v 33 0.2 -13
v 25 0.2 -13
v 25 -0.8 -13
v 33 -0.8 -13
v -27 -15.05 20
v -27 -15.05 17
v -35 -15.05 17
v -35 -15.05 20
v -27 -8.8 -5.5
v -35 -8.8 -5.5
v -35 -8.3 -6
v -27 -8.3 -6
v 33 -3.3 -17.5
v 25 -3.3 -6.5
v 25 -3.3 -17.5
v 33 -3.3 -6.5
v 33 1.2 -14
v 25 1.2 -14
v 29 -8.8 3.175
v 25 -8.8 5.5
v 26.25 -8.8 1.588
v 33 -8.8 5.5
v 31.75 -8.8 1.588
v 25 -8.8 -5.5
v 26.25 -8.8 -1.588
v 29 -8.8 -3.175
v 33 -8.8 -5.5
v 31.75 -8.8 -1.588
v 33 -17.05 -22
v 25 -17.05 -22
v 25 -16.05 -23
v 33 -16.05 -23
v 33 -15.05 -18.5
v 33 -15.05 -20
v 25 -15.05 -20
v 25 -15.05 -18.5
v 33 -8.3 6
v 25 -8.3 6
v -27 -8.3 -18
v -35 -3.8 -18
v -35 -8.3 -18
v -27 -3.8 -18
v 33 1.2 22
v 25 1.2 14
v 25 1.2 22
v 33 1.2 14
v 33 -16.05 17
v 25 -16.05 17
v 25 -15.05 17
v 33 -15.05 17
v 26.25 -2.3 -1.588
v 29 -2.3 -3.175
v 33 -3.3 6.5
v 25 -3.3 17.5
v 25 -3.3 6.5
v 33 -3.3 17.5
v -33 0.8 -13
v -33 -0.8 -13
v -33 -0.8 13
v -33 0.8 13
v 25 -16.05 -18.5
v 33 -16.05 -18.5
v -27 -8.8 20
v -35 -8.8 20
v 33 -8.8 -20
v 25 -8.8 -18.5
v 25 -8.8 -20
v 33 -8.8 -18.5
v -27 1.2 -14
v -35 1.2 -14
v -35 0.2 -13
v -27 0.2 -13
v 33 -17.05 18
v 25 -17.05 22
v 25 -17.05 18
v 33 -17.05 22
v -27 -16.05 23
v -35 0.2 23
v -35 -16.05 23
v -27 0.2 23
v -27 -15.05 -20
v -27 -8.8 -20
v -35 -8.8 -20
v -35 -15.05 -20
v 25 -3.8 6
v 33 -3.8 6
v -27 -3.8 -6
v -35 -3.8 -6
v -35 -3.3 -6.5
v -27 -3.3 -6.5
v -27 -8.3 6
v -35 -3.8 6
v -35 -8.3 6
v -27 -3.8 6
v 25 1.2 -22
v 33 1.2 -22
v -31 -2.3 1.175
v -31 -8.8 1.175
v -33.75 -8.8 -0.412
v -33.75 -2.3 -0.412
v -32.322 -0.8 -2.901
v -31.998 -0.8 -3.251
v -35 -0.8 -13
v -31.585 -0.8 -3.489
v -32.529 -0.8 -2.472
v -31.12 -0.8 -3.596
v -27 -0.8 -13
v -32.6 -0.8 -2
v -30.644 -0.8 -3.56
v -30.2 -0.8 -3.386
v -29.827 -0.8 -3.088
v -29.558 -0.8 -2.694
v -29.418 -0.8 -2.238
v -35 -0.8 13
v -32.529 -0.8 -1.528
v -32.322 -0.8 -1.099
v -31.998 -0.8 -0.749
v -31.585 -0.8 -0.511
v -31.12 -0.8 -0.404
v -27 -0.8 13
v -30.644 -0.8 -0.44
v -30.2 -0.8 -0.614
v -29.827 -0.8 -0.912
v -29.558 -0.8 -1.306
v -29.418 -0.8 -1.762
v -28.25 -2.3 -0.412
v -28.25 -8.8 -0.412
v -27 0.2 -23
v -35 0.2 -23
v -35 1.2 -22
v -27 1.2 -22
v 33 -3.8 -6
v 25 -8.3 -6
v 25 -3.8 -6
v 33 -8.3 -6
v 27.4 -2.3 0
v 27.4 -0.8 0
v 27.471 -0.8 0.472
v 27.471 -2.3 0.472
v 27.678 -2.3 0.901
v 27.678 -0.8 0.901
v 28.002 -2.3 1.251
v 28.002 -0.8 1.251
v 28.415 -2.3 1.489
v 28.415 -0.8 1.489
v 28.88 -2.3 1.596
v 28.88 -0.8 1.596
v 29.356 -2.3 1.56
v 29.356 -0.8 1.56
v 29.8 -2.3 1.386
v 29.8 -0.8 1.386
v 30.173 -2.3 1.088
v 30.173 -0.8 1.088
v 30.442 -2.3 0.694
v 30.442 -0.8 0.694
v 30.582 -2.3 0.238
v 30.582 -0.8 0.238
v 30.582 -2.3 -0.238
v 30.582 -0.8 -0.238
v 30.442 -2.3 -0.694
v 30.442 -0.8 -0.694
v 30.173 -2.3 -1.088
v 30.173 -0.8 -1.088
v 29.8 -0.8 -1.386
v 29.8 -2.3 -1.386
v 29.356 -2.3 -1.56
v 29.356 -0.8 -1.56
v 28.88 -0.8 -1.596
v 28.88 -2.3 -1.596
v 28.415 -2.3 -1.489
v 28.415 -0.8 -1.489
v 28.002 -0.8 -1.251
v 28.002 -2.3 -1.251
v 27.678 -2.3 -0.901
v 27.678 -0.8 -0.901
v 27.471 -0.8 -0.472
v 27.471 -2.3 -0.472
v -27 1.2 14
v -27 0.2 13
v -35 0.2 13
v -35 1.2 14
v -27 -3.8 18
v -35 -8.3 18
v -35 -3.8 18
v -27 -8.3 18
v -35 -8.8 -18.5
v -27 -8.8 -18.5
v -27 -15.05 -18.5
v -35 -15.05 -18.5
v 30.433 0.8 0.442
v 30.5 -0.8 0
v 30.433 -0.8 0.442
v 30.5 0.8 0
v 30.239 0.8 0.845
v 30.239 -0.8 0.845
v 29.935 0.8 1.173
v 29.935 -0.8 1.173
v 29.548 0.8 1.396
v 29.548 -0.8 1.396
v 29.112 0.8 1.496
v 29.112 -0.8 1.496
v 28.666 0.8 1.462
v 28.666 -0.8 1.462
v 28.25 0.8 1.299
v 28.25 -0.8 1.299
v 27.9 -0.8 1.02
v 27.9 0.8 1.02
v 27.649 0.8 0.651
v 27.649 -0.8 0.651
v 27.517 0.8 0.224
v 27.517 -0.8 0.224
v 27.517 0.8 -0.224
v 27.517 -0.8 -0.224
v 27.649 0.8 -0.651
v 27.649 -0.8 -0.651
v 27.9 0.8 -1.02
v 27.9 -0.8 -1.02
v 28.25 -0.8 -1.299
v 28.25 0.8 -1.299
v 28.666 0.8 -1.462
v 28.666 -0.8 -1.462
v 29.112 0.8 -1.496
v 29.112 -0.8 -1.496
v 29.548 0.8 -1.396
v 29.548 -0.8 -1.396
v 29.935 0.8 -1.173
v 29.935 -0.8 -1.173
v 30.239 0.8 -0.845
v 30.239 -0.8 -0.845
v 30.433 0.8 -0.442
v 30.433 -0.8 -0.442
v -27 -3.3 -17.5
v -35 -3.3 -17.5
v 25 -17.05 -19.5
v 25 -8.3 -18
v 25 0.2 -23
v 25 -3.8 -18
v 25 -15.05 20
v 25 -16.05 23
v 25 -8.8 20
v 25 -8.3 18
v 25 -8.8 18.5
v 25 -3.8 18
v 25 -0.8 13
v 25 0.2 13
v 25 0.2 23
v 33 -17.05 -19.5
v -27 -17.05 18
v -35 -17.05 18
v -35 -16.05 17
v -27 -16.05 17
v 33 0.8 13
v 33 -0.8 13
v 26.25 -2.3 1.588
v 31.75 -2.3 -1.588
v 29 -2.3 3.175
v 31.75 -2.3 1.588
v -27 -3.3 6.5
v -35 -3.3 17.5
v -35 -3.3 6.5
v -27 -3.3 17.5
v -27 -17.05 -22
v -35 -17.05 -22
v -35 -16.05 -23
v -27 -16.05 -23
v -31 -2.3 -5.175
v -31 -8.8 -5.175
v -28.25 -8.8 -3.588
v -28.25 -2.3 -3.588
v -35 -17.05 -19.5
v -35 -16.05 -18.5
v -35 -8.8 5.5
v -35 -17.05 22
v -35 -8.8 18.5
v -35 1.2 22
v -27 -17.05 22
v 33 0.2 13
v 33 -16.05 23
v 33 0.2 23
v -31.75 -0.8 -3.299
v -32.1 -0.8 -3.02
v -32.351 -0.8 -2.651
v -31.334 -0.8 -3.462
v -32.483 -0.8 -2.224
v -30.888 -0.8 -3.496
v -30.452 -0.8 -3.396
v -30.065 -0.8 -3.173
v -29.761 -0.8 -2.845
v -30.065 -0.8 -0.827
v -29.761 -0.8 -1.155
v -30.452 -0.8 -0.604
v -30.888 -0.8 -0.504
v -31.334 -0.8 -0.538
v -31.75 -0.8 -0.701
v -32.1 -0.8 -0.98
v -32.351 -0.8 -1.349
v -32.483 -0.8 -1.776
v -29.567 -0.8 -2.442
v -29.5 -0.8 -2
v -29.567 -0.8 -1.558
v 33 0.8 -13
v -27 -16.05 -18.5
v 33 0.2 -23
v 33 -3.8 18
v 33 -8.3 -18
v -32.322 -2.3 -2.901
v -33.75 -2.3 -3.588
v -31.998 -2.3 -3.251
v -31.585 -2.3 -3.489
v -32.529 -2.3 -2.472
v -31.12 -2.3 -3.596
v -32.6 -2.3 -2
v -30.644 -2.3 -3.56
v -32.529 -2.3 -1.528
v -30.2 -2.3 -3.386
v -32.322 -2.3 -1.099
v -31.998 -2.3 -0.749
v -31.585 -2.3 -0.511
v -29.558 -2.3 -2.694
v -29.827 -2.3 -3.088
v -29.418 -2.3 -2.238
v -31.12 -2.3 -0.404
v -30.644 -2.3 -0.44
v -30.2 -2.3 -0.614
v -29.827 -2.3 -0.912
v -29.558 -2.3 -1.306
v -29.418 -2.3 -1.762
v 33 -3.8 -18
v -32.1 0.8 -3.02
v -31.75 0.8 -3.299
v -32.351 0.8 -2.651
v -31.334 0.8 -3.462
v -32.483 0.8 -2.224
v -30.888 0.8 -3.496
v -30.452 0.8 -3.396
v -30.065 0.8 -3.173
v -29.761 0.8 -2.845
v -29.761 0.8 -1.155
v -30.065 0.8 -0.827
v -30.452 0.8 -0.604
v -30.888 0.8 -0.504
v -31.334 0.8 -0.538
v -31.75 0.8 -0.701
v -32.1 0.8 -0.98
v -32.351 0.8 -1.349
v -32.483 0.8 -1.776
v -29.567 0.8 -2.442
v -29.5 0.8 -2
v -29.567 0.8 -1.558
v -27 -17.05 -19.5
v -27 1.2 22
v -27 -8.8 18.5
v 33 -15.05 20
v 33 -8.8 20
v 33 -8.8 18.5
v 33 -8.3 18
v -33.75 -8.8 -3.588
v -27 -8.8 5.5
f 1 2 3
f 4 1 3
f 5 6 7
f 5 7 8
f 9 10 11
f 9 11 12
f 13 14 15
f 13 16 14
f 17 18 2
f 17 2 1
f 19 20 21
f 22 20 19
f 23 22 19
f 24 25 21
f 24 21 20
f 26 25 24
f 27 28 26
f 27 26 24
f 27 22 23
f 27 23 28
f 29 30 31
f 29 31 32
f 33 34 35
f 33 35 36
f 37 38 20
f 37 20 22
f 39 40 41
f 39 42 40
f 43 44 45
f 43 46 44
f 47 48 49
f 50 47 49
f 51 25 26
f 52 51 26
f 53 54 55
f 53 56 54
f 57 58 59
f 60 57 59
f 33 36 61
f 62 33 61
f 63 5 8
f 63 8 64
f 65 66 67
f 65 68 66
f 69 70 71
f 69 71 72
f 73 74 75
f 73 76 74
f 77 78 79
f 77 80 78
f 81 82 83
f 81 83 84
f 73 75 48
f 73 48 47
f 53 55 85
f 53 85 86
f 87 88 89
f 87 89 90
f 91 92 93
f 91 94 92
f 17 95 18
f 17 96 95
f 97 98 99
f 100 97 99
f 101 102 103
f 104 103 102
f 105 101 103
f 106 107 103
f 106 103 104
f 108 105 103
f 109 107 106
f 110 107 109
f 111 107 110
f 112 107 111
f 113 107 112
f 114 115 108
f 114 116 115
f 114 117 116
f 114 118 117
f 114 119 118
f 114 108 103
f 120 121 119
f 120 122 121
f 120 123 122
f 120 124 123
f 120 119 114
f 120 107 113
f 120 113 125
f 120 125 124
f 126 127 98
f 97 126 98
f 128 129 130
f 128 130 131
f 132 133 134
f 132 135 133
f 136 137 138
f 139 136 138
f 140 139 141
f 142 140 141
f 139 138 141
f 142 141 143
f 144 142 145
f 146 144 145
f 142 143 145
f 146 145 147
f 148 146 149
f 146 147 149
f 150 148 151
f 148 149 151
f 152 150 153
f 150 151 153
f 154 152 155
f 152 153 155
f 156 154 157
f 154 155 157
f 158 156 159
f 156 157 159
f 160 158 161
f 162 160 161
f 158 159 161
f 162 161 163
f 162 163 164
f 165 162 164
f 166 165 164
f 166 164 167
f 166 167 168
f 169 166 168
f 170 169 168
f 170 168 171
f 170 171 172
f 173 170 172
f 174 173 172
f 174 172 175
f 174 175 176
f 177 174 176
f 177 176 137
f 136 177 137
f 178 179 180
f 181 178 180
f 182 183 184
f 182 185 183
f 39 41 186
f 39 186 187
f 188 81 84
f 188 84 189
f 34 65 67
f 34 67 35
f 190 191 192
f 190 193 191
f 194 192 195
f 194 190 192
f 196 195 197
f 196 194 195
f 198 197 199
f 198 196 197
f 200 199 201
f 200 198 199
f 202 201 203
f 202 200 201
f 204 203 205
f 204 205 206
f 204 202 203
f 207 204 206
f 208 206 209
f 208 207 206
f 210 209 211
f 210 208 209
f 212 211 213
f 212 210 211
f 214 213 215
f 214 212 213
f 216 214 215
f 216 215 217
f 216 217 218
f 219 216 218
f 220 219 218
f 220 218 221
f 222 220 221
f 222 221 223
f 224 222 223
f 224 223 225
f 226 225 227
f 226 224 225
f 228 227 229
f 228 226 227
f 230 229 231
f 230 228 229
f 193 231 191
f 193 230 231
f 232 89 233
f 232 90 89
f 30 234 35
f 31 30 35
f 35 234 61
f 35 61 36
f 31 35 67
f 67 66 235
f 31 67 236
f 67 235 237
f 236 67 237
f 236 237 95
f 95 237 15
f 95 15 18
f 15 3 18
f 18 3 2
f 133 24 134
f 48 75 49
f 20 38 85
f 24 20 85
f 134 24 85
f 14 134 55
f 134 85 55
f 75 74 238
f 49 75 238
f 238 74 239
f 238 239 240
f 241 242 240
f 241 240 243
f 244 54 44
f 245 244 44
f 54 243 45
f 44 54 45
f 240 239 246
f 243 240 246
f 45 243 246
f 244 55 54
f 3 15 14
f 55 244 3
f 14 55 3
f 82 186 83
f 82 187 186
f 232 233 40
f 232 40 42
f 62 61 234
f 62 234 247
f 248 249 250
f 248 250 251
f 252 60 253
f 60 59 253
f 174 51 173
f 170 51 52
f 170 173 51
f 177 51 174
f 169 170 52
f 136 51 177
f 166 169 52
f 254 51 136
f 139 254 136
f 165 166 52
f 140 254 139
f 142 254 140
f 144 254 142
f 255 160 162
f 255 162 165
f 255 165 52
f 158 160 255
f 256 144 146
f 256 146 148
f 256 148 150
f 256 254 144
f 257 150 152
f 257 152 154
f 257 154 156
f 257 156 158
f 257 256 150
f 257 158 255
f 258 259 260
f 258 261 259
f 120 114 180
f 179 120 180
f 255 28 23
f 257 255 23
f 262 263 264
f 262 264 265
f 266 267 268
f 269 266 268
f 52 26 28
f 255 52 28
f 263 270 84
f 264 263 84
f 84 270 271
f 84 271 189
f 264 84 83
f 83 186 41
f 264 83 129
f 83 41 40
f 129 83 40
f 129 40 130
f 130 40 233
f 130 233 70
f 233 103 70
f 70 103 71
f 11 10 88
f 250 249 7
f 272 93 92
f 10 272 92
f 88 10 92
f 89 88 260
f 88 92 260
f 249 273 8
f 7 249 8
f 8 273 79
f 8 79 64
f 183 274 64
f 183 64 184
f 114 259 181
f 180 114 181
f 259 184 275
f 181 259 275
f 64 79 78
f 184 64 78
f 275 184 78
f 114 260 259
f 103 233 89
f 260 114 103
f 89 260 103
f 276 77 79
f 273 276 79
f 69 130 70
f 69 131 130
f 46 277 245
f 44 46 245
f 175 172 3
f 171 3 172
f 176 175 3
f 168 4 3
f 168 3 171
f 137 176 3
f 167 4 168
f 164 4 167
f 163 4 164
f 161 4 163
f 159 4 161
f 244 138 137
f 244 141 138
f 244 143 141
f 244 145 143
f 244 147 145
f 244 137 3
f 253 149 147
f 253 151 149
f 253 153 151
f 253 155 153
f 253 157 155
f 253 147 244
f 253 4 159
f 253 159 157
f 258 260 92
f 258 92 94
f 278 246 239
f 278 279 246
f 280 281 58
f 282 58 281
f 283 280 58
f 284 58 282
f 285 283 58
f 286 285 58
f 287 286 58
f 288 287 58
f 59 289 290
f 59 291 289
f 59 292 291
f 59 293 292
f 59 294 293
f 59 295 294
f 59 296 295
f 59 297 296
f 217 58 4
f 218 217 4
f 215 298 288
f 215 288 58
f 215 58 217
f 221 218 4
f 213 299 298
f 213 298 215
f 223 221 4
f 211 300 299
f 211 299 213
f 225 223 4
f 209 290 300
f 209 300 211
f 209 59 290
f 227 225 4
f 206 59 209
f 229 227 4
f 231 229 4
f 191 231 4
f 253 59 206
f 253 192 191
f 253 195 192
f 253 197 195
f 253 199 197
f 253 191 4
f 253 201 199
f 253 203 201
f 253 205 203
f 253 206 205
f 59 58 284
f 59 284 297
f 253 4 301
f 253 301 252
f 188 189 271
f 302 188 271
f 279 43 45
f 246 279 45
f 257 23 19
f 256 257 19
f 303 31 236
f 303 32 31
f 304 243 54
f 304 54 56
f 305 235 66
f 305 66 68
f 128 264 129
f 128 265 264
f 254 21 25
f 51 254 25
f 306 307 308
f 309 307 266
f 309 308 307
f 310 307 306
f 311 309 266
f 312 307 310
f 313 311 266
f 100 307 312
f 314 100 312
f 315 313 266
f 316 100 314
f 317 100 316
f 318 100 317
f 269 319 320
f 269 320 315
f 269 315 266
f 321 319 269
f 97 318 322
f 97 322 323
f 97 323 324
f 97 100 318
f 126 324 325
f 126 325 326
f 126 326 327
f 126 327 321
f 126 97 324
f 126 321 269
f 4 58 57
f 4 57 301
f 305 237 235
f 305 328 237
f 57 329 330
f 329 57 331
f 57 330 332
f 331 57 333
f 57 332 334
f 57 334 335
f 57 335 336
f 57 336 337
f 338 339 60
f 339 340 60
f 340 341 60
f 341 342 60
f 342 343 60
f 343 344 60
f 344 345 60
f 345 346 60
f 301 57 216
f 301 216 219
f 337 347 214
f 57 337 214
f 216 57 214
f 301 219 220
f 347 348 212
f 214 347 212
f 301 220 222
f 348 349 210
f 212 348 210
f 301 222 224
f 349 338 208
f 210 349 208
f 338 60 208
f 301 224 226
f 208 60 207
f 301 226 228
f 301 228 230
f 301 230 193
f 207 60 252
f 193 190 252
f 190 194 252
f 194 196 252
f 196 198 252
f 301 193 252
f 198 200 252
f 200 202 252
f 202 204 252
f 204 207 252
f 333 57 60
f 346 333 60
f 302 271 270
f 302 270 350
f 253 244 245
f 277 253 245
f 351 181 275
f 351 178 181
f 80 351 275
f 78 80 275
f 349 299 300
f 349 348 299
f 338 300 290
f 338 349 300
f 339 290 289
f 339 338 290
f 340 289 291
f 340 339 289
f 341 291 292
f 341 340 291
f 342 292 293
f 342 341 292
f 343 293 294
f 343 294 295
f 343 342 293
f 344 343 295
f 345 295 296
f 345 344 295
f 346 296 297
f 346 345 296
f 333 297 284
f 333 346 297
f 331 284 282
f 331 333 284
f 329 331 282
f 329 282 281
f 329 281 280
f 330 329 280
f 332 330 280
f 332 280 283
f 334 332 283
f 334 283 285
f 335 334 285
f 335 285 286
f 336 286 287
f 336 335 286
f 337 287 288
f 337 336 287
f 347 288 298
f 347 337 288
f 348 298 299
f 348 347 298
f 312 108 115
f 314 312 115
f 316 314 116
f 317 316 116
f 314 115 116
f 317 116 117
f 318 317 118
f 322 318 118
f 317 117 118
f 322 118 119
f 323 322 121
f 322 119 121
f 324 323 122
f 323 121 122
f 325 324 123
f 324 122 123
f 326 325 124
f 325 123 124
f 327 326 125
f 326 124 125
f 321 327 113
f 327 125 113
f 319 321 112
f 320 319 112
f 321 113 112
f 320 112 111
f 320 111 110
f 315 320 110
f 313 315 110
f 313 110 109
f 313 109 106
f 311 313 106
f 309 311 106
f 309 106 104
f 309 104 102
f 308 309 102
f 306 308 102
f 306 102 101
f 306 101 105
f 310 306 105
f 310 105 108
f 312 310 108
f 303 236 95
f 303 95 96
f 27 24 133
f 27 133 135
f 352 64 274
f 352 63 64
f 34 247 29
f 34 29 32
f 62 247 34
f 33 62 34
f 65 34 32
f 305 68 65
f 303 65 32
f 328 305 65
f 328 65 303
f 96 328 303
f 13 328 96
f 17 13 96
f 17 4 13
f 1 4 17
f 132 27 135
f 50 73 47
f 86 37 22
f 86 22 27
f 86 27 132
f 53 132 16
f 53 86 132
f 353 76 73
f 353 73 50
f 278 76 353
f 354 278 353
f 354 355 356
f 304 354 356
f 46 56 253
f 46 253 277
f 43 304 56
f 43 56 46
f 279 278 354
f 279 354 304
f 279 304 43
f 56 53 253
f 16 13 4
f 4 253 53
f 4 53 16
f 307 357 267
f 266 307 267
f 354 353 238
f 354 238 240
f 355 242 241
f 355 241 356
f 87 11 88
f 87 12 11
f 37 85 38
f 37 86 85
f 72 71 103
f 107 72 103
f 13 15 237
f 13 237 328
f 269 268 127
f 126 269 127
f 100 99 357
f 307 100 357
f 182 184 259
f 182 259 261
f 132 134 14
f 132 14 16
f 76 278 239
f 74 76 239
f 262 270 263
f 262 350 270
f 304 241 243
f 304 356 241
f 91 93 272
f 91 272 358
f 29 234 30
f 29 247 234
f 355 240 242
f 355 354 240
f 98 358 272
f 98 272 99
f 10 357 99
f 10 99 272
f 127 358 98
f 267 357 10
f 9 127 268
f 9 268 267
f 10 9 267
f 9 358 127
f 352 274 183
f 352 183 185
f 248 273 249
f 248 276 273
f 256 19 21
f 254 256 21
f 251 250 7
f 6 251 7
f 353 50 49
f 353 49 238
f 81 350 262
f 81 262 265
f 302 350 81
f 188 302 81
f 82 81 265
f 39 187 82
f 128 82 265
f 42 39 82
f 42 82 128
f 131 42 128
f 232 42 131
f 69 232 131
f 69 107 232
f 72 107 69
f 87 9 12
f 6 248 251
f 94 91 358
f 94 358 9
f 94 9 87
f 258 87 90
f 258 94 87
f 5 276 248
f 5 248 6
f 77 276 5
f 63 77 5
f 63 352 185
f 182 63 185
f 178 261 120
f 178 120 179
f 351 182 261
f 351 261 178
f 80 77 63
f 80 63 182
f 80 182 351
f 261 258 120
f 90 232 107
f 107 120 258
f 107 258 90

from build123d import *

# Parameters (mm, degrees)
F0_W      = 66
F0_H      = 26
F0_R      = 1.5
F1_DEPTH  = 0.8
F4_DEPTH  = 4
F5_SIZE   = 0.5
F6_SIZE   = 1
F10_DEPTH = 6.5
F11_D     = 3.2
F11_2_D   = 3.2


with BuildPart() as f1:
    # F0 (on Front) → F1 (new body, symmetric)
    with BuildSketch(Plane.XZ):
        Rectangle(F0_W, F0_H)
        with Locations((-31, -2)):
            Circle(F0_R, mode=Mode.SUBTRACT)
        with Locations((29, 0)):
            Circle(F0_R, mode=Mode.SUBTRACT)
    extrude(amount=F1_DEPTH, both=True)


with BuildPart() as f4:
    # F3 (on face) → F4 (new body, symmetric)
    with BuildSketch(Plane.YZ.offset(29)):
        Polygon((-17.05, 23), (-17.05, 17), (-15.05, 17), (-15.05, 20), (-8.8, 20), (-8.8, 18), (-3.3, 18), (-3.3, 6), (-8.8, 6), (-8.8, -6), (-3.3, -6), (-3.3, -18), (-8.8, -18), (-8.8, -20), (-15.05, -20), (-15.05, -18.5), (-17.05, -18.5), (-17.05, -23), (1.2, -23), (1.2, -13), (-0.8, -13), (-0.8, 13), (1.2, 13), (1.2, 23), align=None)
    extrude(amount=F4_DEPTH, both=True)

    # F5
    f5_edges = [f4.edges().sort_by_distance(p)[0] for p in [
        (29, -8.8, 18),
        (29, -3.3, 18),
        (29, -3.3, 6),
        (29, -8.8, 6),
        (29, -8.8, -6),
        (29, -3.3, -6),
        (29, -3.3, -18),
        (29, -8.8, -18),
    ]]
    chamfer(f5_edges, length=F5_SIZE)

    # F6
    f6_edges = [f4.edges().sort_by_distance(p)[0] for p in [
        (29, 1.2, -23),
        (29, -17.05, -23),
        (29, -17.05, 23),
        (29, -17.05, 17),
        (29, -17.05, -18.5),
        (29, 1.2, 23),
        (29, 1.2, 13),
        (29, 1.2, -13),
    ]]
    chamfer(f6_edges, length=F6_SIZE)


with BuildPart() as f7_1:
    # F7: copy of F4
    add(f4.part.moved(Location((-60, 0, 0))))

    # F8: cut F1
    add(f1.part, mode=Mode.SUBTRACT)


with BuildPart() as f4_1:
    add(f4.part)

    # F8: cut F1
    add(f1.part, mode=Mode.SUBTRACT)


with BuildPart() as f10_tool:
    # F9 (on face) → F10 (new body)
    with BuildSketch(Plane.XZ.offset(8.8)):
        Polygon((-33.75, -0.4122867597), (-33.75, -3.5877132403), (-31, -5.1754264805), (-28.25, -3.5877132403), (-28.25, -0.4122867597), (-31, 1.1754264805), align=None)
        Polygon((26.25, 1.5877132403), (26.25, -1.5877132403), (29, -3.1754264805), (31.75, -1.5877132403), (31.75, 1.5877132403), (29, 3.1754264805), align=None)
    extrude(amount=-F10_DEPTH)


with BuildPart() as f4_2:
    add(f4_1.part)

    # F10: cut by f10_tool
    add(f10_tool.part, mode=Mode.SUBTRACT)

    # F11 (through all)
    with Locations(Plane.XZ.offset(8.8)):
        with Locations((-31, -2), (29, 0)):
            Hole(F11_D / 2)


with BuildPart() as f7_1_1:
    add(f7_1.part)

    # F10: cut by f10_tool
    add(f10_tool.part, mode=Mode.SUBTRACT)

    # F11#2 (through all)
    with Locations(Plane.XZ.offset(8.8)):
        with Locations((-31, -2), (29, 0)):
            Hole(F11_2_D / 2)


solid = Compound([f1.part, f4_2.part, f7_1_1.part])
